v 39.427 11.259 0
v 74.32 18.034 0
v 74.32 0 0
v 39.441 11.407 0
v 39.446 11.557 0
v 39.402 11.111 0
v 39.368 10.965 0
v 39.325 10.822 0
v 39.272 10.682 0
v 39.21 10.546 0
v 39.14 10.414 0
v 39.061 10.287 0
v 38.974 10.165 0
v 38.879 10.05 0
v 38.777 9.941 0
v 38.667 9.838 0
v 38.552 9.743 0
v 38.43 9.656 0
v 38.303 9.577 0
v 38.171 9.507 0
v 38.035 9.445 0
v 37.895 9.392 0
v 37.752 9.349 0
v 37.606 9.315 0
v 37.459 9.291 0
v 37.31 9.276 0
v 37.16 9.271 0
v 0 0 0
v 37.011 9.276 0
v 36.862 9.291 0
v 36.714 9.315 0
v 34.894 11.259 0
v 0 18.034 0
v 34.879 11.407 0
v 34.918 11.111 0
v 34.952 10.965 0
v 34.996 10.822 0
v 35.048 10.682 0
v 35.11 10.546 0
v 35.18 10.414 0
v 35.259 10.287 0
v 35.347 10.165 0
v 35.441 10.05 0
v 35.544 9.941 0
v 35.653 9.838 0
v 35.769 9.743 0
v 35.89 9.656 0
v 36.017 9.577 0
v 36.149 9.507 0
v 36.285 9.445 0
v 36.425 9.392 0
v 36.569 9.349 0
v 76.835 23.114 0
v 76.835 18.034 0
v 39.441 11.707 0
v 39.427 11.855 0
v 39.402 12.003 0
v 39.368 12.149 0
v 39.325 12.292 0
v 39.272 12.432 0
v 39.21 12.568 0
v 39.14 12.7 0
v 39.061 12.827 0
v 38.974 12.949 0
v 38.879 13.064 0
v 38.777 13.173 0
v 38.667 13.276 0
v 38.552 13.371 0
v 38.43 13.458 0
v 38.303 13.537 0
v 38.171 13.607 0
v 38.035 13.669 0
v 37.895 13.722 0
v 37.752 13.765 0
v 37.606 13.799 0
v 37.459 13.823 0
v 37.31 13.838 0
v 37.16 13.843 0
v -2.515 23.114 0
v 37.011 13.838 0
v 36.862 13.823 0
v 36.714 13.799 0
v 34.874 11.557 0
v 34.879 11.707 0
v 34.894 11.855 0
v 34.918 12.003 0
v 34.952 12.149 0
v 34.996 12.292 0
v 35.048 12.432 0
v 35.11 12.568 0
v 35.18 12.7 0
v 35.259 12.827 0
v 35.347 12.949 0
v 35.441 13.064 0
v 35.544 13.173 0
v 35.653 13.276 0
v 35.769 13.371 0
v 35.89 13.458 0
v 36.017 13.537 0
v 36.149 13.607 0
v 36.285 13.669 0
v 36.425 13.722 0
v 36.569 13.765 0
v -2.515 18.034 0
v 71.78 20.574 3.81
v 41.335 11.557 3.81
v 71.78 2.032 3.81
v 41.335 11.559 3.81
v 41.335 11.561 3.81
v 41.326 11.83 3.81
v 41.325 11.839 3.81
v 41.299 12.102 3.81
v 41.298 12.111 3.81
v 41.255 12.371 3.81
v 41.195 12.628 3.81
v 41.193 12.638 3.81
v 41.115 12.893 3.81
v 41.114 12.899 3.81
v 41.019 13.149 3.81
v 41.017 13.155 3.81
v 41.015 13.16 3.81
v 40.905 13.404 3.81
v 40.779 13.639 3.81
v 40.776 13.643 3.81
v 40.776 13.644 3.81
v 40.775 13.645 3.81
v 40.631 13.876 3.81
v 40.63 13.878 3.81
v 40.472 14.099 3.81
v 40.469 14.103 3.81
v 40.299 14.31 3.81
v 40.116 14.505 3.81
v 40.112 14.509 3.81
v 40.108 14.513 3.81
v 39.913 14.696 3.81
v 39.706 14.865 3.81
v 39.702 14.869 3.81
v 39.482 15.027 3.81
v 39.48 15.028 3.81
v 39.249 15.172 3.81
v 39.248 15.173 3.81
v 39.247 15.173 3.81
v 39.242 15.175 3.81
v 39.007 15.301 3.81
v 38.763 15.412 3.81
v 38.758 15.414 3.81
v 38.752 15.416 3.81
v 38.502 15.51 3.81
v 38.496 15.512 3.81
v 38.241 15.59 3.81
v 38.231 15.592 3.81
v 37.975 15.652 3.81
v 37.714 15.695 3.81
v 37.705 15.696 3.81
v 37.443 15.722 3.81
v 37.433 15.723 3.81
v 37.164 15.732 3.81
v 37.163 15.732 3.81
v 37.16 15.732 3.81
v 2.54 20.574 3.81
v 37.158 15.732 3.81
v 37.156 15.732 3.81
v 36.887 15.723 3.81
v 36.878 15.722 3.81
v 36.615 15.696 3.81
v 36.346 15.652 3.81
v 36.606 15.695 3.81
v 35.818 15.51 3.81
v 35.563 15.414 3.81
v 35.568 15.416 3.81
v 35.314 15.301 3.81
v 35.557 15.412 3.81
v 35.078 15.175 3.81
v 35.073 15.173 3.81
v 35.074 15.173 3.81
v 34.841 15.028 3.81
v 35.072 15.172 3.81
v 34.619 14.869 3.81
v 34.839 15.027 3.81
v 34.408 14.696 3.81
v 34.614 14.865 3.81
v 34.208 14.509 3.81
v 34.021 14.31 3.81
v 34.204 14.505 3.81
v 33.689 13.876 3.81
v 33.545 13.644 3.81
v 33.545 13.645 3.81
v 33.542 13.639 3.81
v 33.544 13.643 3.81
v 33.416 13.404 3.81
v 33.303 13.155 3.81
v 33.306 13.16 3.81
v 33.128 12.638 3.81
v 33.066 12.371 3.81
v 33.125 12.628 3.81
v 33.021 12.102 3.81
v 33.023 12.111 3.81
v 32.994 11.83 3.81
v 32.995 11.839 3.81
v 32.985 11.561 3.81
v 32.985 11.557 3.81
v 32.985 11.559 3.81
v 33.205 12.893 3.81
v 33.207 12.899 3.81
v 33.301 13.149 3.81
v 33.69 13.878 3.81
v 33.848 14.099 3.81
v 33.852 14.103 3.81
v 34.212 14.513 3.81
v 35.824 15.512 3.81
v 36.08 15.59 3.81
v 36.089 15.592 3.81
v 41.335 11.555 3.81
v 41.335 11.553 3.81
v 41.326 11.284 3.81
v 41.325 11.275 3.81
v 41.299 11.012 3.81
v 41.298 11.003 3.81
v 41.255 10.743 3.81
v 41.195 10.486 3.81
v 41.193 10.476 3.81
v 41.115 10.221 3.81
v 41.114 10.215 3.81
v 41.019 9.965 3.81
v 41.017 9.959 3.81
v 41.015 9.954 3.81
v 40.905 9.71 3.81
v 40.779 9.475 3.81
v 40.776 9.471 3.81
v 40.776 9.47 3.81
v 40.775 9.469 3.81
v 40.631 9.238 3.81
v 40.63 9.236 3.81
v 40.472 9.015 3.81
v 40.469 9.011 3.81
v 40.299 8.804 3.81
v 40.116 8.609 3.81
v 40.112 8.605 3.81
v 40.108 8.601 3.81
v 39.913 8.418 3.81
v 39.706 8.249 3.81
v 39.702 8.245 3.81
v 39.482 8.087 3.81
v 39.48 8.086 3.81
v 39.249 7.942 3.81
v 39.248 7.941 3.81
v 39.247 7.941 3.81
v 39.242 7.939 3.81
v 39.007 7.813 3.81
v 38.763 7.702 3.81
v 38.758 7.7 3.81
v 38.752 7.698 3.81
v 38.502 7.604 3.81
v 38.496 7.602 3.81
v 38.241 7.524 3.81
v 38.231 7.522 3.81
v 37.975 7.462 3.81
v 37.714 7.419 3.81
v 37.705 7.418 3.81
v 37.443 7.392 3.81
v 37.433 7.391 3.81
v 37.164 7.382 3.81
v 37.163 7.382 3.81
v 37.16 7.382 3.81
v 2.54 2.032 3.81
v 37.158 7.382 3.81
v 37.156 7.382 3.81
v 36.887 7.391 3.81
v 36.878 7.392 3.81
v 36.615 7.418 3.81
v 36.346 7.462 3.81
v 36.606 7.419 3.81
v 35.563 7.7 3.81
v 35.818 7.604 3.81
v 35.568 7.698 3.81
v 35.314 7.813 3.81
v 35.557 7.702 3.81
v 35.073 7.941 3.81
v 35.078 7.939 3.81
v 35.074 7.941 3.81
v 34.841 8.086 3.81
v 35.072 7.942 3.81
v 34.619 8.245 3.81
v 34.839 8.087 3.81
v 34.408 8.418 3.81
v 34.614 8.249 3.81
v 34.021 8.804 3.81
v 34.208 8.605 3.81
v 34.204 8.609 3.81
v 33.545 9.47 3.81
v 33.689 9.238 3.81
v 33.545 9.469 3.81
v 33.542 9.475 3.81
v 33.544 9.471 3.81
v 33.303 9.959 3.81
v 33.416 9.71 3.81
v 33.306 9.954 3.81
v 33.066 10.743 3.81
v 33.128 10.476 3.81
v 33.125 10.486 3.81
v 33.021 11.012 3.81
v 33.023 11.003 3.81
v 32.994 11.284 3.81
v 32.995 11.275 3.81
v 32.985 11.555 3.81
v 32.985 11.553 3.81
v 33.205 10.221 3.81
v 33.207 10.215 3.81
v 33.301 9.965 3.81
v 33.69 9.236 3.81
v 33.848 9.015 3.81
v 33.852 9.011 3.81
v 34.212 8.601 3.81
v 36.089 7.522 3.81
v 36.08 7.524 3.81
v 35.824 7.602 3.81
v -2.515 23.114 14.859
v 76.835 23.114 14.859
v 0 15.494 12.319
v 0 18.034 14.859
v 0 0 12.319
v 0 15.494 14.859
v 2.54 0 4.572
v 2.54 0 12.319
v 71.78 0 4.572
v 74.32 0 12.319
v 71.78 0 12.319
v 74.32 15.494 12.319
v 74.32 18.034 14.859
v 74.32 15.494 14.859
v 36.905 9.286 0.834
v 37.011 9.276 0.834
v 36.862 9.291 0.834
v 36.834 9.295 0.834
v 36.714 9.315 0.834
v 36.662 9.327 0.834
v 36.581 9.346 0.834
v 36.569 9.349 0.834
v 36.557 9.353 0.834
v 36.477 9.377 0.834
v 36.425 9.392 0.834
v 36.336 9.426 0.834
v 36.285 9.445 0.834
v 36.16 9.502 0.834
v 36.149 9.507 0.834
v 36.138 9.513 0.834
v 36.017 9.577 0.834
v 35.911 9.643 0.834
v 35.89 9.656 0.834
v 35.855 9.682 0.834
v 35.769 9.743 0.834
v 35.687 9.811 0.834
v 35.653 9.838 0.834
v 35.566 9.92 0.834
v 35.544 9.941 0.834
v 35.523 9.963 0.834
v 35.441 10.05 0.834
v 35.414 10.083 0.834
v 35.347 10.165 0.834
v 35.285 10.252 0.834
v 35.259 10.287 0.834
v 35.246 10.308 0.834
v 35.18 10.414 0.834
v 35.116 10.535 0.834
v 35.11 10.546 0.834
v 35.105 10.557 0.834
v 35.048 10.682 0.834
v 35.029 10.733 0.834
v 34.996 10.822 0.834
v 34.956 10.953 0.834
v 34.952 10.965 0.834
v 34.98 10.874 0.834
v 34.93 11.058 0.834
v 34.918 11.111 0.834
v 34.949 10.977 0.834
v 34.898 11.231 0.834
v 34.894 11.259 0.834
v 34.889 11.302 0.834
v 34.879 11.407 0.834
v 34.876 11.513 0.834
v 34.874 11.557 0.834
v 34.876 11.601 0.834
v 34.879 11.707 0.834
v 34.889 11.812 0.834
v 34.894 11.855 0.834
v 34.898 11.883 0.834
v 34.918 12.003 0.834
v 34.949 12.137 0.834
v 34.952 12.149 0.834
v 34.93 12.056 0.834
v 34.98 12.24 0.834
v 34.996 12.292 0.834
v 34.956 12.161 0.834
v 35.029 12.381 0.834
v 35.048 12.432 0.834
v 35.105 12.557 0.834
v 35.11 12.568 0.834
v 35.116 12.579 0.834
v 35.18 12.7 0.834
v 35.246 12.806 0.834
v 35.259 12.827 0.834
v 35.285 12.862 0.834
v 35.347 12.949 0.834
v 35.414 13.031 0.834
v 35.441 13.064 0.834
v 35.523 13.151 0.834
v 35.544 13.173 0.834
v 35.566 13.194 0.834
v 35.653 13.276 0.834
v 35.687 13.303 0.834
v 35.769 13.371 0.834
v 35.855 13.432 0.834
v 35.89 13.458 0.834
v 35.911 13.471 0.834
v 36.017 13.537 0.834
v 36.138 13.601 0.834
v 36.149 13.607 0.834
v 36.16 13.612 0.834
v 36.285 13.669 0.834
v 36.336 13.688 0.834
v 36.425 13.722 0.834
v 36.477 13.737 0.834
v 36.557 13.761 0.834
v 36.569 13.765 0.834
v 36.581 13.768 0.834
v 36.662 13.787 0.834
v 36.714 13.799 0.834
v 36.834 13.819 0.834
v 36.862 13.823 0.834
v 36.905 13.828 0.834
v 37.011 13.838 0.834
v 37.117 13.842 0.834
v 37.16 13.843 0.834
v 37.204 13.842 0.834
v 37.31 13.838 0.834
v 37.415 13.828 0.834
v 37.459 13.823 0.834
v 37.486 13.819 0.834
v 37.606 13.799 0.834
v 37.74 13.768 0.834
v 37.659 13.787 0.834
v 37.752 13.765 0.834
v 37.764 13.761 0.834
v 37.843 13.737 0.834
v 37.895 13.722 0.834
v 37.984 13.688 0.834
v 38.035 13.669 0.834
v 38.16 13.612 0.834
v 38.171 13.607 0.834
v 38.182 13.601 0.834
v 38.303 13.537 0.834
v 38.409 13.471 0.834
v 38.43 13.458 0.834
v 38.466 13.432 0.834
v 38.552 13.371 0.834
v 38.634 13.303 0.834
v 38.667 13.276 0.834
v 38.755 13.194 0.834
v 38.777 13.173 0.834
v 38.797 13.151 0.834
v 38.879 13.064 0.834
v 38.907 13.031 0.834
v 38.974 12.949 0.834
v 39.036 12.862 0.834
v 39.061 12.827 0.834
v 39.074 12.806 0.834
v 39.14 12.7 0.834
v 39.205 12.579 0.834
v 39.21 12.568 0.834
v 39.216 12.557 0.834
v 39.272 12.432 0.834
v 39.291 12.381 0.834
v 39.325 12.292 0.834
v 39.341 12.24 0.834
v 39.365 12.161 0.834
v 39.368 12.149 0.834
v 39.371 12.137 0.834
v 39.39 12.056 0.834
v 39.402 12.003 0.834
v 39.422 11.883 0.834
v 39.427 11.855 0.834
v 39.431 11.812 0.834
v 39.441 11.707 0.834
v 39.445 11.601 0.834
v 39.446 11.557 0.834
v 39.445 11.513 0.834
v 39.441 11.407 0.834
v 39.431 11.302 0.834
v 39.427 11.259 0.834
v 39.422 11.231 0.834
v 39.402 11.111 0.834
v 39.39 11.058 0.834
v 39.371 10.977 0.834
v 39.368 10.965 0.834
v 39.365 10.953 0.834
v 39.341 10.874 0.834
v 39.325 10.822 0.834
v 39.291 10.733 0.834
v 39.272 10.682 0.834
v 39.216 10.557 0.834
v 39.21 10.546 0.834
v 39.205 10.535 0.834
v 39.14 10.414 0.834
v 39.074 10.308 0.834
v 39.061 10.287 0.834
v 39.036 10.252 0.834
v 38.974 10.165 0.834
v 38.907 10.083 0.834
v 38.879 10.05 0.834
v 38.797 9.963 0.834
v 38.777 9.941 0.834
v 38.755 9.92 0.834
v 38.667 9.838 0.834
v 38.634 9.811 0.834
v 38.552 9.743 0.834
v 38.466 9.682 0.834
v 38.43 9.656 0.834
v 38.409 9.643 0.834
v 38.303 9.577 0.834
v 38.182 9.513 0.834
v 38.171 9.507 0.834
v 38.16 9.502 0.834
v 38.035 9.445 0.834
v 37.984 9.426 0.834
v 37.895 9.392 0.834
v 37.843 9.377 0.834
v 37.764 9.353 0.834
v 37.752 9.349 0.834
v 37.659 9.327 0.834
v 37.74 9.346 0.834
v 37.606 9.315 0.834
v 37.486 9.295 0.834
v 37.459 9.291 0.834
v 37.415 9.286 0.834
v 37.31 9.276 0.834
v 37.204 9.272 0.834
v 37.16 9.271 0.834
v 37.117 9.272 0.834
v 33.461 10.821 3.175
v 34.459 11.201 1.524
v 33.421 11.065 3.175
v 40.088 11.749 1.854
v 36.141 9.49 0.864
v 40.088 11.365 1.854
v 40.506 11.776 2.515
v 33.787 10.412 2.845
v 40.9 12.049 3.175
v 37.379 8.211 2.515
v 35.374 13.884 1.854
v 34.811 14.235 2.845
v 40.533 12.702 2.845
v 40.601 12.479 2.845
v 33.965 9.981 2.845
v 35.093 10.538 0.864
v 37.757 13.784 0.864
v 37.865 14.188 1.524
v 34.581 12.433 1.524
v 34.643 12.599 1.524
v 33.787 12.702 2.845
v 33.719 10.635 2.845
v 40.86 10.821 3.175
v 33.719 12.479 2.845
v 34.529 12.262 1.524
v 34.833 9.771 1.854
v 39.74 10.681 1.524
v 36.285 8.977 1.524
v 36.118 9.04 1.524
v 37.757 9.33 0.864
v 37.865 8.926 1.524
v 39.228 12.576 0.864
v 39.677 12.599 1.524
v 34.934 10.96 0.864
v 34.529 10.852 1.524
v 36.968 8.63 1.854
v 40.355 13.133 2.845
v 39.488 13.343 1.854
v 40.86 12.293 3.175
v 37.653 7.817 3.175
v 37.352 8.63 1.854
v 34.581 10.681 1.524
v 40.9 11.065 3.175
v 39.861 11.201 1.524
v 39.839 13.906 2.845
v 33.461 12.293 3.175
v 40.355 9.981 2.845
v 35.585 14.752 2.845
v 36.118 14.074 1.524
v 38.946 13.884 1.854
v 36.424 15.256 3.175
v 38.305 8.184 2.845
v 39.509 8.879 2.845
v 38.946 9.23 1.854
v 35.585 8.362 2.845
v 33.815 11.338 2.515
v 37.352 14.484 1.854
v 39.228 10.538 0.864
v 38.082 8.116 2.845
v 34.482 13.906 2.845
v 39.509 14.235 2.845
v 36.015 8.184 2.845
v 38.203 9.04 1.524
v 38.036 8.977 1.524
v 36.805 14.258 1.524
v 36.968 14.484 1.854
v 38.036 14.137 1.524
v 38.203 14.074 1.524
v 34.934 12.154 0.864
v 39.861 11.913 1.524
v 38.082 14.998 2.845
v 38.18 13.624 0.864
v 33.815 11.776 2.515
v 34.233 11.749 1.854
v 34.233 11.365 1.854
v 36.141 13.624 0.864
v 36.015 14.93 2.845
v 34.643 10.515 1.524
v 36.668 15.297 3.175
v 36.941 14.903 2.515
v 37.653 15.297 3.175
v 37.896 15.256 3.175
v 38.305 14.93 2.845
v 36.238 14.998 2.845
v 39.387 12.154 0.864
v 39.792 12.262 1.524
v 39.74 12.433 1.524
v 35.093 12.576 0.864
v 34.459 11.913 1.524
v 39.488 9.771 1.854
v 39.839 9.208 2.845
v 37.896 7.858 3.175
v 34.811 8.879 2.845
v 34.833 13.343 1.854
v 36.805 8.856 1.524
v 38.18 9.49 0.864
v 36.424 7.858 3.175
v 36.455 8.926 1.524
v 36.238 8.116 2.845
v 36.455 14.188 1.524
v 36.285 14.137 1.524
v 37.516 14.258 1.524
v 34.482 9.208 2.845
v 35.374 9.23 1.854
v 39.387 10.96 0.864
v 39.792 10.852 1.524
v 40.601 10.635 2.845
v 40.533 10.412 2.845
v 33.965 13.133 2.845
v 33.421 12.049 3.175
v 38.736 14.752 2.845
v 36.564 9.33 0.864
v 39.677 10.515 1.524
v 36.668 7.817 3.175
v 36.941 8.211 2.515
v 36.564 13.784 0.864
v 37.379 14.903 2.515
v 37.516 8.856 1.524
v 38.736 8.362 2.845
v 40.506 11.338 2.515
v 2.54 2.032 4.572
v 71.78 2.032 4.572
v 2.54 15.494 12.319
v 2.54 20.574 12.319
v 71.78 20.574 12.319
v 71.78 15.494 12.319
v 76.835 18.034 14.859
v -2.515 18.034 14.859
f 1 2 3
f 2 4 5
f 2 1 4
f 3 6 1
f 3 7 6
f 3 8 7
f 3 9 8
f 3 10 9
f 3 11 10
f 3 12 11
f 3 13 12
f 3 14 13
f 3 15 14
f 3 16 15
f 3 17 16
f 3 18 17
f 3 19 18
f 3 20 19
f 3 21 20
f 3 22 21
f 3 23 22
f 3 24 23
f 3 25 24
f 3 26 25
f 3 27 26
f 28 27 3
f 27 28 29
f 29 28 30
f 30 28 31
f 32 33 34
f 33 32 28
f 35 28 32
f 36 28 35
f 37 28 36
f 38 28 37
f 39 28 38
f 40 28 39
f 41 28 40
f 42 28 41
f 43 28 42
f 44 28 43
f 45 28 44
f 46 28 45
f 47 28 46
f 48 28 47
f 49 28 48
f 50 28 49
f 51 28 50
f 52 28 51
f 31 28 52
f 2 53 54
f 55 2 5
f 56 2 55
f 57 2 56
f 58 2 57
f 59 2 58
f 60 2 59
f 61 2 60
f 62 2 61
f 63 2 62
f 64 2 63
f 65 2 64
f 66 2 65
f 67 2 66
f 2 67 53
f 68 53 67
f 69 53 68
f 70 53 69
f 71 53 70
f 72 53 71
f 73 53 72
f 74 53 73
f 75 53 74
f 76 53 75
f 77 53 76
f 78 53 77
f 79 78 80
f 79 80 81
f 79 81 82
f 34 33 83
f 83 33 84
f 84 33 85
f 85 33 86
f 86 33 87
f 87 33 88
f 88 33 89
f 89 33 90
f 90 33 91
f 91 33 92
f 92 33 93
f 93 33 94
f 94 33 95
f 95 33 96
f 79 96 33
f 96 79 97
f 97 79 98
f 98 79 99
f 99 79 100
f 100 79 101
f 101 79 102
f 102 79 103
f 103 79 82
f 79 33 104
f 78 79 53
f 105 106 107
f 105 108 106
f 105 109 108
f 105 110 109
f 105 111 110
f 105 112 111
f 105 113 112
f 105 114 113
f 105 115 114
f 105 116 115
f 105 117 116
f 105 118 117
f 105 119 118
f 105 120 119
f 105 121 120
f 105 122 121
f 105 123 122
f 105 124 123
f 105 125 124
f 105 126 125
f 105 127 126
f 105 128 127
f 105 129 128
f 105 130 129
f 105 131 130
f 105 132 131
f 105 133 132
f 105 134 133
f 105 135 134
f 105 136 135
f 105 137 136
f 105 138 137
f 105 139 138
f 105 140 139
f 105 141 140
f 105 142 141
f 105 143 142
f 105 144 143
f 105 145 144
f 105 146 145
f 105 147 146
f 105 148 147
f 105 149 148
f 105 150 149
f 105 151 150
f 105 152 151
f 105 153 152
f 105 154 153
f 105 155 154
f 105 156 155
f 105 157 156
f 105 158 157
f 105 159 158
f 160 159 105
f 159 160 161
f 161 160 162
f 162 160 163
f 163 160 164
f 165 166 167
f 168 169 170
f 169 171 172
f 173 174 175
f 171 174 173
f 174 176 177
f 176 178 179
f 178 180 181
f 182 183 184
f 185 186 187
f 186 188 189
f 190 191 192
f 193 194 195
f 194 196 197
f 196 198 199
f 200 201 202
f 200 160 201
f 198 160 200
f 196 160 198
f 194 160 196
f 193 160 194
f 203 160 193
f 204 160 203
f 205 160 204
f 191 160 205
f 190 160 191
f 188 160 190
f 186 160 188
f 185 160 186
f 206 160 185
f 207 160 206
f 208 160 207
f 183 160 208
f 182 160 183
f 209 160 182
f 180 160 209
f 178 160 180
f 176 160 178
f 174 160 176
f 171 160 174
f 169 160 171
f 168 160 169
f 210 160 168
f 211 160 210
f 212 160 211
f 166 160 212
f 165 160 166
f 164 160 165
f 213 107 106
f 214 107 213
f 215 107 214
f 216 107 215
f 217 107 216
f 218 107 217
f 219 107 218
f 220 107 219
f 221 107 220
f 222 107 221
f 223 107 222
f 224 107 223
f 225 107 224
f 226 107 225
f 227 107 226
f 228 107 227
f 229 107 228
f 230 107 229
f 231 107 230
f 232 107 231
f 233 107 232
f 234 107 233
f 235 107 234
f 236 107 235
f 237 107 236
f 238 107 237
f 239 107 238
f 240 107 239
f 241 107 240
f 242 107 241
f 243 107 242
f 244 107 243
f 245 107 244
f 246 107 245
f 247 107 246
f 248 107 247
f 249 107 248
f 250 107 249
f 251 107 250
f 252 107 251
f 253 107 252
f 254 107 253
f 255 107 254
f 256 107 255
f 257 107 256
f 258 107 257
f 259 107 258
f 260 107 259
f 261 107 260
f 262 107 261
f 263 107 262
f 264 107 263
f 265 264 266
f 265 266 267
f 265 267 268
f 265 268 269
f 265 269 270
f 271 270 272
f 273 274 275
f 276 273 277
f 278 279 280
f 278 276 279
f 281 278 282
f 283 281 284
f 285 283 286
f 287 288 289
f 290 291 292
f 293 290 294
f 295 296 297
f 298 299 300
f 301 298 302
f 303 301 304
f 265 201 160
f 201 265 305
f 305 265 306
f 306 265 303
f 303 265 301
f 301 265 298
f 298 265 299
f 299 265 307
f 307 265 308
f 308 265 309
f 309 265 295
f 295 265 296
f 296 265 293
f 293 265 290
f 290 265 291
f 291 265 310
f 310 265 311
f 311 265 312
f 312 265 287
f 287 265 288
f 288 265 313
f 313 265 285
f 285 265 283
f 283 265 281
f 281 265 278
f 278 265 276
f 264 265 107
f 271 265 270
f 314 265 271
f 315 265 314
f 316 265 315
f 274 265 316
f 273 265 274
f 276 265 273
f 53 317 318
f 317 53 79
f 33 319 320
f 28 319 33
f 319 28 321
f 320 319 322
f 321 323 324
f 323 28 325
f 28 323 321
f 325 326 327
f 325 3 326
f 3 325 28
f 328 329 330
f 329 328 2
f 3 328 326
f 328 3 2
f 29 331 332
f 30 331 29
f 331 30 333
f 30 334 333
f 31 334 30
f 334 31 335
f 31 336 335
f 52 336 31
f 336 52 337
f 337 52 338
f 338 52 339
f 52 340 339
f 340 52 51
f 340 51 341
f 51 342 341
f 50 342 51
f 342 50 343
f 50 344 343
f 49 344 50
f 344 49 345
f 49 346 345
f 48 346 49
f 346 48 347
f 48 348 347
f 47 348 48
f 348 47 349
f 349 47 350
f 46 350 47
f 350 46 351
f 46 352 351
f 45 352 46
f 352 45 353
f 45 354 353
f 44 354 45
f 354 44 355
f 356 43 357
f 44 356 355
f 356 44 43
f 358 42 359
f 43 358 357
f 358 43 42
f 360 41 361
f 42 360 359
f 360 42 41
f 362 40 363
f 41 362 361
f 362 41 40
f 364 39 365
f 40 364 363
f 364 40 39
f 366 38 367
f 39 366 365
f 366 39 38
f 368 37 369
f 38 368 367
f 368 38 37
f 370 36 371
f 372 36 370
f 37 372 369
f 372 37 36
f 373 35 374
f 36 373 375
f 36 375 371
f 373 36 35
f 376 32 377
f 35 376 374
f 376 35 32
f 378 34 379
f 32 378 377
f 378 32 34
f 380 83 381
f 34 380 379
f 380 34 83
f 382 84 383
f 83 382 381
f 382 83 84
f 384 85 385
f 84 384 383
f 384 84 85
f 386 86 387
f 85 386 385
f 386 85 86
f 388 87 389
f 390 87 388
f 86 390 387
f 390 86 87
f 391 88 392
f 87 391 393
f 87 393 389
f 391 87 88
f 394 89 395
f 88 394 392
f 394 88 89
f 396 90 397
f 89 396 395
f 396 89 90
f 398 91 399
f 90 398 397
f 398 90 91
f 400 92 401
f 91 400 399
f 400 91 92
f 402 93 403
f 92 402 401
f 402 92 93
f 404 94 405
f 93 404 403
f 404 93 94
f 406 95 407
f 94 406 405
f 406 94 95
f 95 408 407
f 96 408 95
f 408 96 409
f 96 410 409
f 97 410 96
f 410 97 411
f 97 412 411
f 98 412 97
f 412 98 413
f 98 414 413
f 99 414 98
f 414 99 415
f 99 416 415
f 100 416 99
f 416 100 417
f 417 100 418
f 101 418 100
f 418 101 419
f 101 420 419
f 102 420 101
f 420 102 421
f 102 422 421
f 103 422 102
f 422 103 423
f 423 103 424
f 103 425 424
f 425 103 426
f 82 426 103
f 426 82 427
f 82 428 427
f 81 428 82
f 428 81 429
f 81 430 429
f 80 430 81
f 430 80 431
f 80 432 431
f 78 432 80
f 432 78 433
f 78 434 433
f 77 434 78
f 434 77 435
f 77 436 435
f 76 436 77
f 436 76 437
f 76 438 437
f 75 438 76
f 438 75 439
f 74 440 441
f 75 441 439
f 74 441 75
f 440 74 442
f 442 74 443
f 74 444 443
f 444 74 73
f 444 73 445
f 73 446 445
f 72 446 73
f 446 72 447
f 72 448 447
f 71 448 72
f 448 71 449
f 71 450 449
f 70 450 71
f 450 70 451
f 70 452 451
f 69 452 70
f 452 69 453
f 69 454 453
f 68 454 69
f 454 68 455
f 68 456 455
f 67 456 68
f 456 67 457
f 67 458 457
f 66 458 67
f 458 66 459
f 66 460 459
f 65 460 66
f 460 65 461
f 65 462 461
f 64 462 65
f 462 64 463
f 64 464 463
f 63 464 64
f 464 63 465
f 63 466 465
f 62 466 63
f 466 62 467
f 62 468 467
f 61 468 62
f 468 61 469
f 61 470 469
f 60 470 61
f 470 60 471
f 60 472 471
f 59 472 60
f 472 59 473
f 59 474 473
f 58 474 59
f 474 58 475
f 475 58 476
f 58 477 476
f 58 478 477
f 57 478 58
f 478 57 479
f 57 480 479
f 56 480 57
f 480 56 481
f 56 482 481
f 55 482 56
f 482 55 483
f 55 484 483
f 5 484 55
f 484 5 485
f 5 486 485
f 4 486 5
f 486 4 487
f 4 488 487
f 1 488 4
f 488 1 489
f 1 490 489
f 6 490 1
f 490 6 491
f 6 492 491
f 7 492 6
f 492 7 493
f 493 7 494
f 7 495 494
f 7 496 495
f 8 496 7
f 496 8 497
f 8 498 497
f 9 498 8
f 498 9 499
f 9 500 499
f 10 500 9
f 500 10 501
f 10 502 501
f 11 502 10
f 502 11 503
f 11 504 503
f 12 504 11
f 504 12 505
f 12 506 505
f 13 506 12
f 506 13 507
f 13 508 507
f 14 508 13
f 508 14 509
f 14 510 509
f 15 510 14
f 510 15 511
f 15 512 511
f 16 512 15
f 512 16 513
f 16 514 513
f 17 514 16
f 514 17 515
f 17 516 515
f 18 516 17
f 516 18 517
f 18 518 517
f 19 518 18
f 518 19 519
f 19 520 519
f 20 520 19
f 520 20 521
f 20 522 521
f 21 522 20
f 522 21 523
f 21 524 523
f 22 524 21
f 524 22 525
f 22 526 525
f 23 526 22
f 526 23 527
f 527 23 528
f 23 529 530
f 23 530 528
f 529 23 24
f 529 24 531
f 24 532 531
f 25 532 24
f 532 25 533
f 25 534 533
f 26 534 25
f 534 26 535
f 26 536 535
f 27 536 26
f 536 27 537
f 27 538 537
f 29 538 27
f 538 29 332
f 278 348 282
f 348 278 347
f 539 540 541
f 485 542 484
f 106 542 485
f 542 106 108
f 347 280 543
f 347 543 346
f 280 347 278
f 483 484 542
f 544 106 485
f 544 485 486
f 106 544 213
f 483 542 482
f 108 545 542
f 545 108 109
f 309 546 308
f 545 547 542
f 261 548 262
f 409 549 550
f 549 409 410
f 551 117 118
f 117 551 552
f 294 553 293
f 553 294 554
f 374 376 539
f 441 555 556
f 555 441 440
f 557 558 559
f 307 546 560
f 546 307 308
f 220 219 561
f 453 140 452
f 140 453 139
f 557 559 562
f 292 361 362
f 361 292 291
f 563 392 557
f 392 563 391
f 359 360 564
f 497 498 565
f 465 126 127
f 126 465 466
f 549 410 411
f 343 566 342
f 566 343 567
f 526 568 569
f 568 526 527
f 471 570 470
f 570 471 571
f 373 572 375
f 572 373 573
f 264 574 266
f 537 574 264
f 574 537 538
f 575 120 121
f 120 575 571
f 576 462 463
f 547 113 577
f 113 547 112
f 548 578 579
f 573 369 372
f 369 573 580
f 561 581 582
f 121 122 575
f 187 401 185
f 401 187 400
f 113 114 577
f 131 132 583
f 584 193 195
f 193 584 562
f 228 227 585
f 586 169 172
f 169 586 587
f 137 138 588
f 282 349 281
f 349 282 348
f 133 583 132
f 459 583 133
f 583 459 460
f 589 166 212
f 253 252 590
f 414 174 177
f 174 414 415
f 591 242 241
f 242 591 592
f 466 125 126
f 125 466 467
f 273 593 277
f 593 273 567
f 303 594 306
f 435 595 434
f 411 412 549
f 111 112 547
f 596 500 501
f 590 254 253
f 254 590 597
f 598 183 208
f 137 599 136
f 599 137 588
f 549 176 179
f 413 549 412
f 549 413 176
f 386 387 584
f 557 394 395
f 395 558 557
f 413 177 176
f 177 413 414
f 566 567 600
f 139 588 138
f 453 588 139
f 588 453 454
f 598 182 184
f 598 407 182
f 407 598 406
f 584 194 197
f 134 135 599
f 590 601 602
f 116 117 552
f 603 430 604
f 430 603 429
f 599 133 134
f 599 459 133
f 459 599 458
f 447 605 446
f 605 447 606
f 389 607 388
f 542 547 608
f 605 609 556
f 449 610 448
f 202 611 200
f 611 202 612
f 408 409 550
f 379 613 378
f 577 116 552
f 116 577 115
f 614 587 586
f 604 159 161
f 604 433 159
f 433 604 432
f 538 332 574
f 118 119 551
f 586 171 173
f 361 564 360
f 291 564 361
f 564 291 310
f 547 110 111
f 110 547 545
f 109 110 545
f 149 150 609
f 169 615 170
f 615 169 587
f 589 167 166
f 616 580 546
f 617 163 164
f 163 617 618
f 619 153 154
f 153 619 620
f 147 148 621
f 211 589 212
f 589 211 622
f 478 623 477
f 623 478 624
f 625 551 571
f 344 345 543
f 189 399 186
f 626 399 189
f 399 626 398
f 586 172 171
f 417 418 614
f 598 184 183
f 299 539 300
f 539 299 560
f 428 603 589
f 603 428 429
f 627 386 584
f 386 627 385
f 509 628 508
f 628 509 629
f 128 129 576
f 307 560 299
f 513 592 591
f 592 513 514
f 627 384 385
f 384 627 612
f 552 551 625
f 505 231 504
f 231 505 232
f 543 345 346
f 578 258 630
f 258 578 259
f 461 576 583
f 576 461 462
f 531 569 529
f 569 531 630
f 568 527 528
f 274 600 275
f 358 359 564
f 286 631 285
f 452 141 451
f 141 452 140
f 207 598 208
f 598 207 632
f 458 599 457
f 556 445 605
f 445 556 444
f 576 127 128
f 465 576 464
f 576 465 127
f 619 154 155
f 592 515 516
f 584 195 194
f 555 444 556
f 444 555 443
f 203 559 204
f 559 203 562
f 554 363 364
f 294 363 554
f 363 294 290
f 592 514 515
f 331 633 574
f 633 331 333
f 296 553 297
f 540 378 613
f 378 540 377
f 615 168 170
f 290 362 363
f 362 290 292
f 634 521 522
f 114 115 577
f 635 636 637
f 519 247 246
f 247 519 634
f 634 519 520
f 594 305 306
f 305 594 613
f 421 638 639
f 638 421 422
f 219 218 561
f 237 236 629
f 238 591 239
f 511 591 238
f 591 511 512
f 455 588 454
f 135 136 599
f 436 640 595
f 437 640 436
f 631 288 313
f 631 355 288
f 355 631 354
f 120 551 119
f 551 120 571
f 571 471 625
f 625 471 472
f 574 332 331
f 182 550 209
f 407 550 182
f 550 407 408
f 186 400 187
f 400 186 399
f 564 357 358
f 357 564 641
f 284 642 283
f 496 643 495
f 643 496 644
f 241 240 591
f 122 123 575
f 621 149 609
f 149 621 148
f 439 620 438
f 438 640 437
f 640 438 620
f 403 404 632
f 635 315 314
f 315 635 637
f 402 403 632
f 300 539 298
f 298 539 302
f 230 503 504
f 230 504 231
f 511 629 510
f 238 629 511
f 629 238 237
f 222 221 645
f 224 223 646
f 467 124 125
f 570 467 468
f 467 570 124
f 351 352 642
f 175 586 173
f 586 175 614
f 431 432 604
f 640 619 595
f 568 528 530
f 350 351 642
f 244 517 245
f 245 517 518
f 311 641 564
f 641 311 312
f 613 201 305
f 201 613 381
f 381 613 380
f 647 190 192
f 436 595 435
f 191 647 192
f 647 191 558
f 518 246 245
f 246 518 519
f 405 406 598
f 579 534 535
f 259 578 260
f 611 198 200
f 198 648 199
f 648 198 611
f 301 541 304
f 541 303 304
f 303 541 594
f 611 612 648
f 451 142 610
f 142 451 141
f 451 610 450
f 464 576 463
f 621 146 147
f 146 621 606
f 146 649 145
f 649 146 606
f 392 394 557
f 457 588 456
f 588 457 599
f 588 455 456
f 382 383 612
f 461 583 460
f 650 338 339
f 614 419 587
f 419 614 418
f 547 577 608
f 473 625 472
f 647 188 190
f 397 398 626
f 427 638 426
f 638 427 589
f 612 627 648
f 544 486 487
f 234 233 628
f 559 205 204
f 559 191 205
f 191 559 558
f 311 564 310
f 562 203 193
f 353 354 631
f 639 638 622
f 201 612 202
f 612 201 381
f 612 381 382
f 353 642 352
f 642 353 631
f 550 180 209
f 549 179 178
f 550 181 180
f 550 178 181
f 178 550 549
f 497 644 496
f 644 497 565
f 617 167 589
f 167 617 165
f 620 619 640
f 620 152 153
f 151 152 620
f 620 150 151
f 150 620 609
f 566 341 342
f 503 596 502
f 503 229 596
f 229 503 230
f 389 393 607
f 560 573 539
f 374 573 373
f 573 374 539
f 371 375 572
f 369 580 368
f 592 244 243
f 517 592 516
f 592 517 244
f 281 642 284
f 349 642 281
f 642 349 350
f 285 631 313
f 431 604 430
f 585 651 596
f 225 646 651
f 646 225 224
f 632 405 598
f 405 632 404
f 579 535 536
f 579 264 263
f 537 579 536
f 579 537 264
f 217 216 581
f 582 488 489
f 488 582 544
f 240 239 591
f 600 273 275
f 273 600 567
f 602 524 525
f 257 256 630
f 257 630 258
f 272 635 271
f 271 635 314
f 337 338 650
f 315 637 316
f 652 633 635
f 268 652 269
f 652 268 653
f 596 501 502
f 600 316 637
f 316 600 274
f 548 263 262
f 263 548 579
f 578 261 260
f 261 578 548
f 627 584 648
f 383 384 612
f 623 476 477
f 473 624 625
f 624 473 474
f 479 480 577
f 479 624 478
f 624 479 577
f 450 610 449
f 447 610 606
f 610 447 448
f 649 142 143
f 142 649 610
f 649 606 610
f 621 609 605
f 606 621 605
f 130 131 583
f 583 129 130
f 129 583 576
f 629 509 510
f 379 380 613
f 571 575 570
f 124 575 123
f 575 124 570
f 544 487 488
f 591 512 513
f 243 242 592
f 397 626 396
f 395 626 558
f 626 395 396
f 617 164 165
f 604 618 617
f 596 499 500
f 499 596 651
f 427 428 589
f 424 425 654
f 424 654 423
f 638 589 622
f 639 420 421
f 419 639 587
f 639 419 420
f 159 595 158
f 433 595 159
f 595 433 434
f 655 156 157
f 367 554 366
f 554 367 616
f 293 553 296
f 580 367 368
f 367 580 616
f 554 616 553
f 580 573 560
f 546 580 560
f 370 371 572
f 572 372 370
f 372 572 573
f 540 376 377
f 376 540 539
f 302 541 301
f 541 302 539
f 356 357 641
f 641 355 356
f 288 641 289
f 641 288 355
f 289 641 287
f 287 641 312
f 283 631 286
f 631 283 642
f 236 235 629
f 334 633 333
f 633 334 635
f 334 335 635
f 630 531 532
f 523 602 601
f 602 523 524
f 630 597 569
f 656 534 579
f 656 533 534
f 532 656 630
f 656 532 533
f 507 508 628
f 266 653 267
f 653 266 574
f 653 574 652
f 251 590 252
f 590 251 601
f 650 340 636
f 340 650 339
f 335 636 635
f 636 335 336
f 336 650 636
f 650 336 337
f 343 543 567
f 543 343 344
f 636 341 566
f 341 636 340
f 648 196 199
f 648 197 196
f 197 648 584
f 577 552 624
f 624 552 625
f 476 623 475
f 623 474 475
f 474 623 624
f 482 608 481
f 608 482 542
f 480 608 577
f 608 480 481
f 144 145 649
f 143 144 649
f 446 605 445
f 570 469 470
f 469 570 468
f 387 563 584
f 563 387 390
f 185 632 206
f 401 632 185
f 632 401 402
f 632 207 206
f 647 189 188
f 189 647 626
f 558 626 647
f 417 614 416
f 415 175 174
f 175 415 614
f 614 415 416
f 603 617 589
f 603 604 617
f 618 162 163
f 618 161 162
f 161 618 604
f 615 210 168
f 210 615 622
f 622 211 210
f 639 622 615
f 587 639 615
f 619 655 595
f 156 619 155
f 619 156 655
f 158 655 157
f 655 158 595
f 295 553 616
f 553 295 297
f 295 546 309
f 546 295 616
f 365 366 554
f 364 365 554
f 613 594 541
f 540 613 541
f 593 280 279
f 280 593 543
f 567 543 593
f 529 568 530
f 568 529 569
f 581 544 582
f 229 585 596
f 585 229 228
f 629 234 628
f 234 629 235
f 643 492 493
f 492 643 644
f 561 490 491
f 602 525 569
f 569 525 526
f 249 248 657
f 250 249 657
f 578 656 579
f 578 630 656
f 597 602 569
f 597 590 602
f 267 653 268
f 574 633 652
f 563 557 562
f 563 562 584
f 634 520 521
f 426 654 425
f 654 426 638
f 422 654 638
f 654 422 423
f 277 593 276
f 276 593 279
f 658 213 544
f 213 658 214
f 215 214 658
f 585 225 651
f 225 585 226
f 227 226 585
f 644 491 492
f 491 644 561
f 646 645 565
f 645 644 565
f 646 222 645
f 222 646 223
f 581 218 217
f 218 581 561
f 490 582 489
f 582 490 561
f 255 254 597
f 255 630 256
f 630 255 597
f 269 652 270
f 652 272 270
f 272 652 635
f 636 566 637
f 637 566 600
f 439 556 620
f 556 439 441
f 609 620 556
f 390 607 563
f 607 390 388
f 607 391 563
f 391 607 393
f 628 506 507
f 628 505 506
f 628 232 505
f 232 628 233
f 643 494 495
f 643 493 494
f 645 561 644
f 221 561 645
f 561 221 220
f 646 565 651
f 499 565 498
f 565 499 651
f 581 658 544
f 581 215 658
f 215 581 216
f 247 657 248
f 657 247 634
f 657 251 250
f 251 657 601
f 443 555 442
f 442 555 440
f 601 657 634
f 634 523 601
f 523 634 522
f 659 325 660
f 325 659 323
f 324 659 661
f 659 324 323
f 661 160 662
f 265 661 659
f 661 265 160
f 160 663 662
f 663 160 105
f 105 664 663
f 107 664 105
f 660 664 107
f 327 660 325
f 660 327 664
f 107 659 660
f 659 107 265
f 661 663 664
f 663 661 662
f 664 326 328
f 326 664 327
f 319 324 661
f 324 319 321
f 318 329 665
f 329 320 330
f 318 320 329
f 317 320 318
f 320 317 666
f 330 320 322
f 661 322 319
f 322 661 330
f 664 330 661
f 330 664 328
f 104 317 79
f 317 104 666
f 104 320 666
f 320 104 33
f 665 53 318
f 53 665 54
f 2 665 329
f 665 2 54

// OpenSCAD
ViewScale = [0.0254, 0.0254, 0.0254];
$fn=96;

cells = [3,5,3];
models=0;
basethick=150;
wallthick=100;

function cumsum(v) = [for (a=0, ii=0; ii<len(v); a=a+v[ii], ii=ii+1) a];
function sum(v) = [for(p=v) 1]*v;

module wagoX(n)
{
    w=235;
    module wago1()
    {
        linear_extrude(23)
        square([235, 710]);

        translate([0, 0, 22])
        linear_extrude(184)
        square([47, 710]);

        translate([0, 0, 184])
        linear_extrude(132)
        square([235, 710]);
    }
    n = n -1;
    for (ii=[0:w:w*n]) {
        translate([ii, 0, 0])
        wago1();
    }
    translate([w*(n+1), 0, 0])
    linear_extrude(316)
    square([47,710]);
}

module screw_No8_5_8()
{
    linear_extrude(height=100, slices=10, scale=0.5)
    circle(300/2);
    translate([0, 0, 99])
    linear_extrude(500)
    circle(150/2);
}


module wagobox(cells)
{

    numcells=cumsum(cells);
    echo("numcells ",numcells);

    if (models) {
        for (ii=[0:len(numcells)-1]) {
            color("cornflowerblue")
            translate([wallthick+235*numcells[ii]+ii*50, wallthick, basethick])
            wagoX(cells[ii]);
        }
    }
    squareX = (wallthick*2)+(sum(cells)*235)+(len(cells)*47);
    squareY = 910;
    difference() {
        linear_extrude(basethick)
        difference() {
            square([squareX, squareY]);
            translate([squareX/2, squareY/2, 0])
            circle(180/2);
        }
        translate([squareX/2, squareY/2, 151])
        rotate([180, 0, 0])
        linear_extrude(height=130, slices=10, scale=0.5)
        circle(330/2);

    }

    // Lower sides and back
    translate([0, 0, basethick-1])
    linear_extrude(31)
    difference() {
        square([squareX, squareY]);
        translate([wallthick, wallthick-20, 0])
        square([squareX-wallthick*2, squareY-wallthick*2+20]);
    }

    // Upper sides and back
    translate([0, 0, basethick+29])
    linear_extrude(326-20)
    difference() {
        square([squareX, squareY]);
        translate([wallthick, -wallthick, 0])
        square([squareX-wallthick*2, squareY]);
    }

    // Top lip
    translate([0, squareY-300, basethick+335])
    linear_extrude(100)
    square([squareX, 300]);

    // Side tabs
    translate([-99, 710, 0])
    linear_extrude(basethick+435)
    square([100, 200]);

    translate([squareX-1, 710, 0])
    linear_extrude(basethick+435)
    square([100, 200]);

}

module lid(cells)
{
    squareX = (wallthick*2)+(sum(cells)*235)+(len(cells)*47);
    squareY = 910;

    module footprint(xadd, yadd)
    {
        translate([-xadd/2, -yadd/2, 0])
        square([squareX+xadd, squareY+yadd]);
        translate([-99-xadd/2, 710-yadd/2, 0])
        square([100, 200+yadd]);

        translate([squareX-1+xadd/2, 710-yadd/2, 0])
        square([100, 200+yadd]);
    }
    linear_extrude(170+50)
    difference() {
        footprint(120, 120);
        footprint(20, 20);
    }

    translate([-30, 100, 120])
    linear_extrude(100)
    square([squareX+40, 100]);

    translate([0, 0, 169+50])
    linear_extrude(50)
    footprint(120, 120);
}
    
module forViewing()
{
    //translate([-100, -100, 0])
    wagobox(cells);
    translate([0, 0, basethick+280-50])
    color("wheat")
    lid(cells);
}

module forPrinting()
{
    wagobox(cells);
//    lid(cells);
}

scale(ViewScale)
{
//    forViewing();
    forPrinting();
}
